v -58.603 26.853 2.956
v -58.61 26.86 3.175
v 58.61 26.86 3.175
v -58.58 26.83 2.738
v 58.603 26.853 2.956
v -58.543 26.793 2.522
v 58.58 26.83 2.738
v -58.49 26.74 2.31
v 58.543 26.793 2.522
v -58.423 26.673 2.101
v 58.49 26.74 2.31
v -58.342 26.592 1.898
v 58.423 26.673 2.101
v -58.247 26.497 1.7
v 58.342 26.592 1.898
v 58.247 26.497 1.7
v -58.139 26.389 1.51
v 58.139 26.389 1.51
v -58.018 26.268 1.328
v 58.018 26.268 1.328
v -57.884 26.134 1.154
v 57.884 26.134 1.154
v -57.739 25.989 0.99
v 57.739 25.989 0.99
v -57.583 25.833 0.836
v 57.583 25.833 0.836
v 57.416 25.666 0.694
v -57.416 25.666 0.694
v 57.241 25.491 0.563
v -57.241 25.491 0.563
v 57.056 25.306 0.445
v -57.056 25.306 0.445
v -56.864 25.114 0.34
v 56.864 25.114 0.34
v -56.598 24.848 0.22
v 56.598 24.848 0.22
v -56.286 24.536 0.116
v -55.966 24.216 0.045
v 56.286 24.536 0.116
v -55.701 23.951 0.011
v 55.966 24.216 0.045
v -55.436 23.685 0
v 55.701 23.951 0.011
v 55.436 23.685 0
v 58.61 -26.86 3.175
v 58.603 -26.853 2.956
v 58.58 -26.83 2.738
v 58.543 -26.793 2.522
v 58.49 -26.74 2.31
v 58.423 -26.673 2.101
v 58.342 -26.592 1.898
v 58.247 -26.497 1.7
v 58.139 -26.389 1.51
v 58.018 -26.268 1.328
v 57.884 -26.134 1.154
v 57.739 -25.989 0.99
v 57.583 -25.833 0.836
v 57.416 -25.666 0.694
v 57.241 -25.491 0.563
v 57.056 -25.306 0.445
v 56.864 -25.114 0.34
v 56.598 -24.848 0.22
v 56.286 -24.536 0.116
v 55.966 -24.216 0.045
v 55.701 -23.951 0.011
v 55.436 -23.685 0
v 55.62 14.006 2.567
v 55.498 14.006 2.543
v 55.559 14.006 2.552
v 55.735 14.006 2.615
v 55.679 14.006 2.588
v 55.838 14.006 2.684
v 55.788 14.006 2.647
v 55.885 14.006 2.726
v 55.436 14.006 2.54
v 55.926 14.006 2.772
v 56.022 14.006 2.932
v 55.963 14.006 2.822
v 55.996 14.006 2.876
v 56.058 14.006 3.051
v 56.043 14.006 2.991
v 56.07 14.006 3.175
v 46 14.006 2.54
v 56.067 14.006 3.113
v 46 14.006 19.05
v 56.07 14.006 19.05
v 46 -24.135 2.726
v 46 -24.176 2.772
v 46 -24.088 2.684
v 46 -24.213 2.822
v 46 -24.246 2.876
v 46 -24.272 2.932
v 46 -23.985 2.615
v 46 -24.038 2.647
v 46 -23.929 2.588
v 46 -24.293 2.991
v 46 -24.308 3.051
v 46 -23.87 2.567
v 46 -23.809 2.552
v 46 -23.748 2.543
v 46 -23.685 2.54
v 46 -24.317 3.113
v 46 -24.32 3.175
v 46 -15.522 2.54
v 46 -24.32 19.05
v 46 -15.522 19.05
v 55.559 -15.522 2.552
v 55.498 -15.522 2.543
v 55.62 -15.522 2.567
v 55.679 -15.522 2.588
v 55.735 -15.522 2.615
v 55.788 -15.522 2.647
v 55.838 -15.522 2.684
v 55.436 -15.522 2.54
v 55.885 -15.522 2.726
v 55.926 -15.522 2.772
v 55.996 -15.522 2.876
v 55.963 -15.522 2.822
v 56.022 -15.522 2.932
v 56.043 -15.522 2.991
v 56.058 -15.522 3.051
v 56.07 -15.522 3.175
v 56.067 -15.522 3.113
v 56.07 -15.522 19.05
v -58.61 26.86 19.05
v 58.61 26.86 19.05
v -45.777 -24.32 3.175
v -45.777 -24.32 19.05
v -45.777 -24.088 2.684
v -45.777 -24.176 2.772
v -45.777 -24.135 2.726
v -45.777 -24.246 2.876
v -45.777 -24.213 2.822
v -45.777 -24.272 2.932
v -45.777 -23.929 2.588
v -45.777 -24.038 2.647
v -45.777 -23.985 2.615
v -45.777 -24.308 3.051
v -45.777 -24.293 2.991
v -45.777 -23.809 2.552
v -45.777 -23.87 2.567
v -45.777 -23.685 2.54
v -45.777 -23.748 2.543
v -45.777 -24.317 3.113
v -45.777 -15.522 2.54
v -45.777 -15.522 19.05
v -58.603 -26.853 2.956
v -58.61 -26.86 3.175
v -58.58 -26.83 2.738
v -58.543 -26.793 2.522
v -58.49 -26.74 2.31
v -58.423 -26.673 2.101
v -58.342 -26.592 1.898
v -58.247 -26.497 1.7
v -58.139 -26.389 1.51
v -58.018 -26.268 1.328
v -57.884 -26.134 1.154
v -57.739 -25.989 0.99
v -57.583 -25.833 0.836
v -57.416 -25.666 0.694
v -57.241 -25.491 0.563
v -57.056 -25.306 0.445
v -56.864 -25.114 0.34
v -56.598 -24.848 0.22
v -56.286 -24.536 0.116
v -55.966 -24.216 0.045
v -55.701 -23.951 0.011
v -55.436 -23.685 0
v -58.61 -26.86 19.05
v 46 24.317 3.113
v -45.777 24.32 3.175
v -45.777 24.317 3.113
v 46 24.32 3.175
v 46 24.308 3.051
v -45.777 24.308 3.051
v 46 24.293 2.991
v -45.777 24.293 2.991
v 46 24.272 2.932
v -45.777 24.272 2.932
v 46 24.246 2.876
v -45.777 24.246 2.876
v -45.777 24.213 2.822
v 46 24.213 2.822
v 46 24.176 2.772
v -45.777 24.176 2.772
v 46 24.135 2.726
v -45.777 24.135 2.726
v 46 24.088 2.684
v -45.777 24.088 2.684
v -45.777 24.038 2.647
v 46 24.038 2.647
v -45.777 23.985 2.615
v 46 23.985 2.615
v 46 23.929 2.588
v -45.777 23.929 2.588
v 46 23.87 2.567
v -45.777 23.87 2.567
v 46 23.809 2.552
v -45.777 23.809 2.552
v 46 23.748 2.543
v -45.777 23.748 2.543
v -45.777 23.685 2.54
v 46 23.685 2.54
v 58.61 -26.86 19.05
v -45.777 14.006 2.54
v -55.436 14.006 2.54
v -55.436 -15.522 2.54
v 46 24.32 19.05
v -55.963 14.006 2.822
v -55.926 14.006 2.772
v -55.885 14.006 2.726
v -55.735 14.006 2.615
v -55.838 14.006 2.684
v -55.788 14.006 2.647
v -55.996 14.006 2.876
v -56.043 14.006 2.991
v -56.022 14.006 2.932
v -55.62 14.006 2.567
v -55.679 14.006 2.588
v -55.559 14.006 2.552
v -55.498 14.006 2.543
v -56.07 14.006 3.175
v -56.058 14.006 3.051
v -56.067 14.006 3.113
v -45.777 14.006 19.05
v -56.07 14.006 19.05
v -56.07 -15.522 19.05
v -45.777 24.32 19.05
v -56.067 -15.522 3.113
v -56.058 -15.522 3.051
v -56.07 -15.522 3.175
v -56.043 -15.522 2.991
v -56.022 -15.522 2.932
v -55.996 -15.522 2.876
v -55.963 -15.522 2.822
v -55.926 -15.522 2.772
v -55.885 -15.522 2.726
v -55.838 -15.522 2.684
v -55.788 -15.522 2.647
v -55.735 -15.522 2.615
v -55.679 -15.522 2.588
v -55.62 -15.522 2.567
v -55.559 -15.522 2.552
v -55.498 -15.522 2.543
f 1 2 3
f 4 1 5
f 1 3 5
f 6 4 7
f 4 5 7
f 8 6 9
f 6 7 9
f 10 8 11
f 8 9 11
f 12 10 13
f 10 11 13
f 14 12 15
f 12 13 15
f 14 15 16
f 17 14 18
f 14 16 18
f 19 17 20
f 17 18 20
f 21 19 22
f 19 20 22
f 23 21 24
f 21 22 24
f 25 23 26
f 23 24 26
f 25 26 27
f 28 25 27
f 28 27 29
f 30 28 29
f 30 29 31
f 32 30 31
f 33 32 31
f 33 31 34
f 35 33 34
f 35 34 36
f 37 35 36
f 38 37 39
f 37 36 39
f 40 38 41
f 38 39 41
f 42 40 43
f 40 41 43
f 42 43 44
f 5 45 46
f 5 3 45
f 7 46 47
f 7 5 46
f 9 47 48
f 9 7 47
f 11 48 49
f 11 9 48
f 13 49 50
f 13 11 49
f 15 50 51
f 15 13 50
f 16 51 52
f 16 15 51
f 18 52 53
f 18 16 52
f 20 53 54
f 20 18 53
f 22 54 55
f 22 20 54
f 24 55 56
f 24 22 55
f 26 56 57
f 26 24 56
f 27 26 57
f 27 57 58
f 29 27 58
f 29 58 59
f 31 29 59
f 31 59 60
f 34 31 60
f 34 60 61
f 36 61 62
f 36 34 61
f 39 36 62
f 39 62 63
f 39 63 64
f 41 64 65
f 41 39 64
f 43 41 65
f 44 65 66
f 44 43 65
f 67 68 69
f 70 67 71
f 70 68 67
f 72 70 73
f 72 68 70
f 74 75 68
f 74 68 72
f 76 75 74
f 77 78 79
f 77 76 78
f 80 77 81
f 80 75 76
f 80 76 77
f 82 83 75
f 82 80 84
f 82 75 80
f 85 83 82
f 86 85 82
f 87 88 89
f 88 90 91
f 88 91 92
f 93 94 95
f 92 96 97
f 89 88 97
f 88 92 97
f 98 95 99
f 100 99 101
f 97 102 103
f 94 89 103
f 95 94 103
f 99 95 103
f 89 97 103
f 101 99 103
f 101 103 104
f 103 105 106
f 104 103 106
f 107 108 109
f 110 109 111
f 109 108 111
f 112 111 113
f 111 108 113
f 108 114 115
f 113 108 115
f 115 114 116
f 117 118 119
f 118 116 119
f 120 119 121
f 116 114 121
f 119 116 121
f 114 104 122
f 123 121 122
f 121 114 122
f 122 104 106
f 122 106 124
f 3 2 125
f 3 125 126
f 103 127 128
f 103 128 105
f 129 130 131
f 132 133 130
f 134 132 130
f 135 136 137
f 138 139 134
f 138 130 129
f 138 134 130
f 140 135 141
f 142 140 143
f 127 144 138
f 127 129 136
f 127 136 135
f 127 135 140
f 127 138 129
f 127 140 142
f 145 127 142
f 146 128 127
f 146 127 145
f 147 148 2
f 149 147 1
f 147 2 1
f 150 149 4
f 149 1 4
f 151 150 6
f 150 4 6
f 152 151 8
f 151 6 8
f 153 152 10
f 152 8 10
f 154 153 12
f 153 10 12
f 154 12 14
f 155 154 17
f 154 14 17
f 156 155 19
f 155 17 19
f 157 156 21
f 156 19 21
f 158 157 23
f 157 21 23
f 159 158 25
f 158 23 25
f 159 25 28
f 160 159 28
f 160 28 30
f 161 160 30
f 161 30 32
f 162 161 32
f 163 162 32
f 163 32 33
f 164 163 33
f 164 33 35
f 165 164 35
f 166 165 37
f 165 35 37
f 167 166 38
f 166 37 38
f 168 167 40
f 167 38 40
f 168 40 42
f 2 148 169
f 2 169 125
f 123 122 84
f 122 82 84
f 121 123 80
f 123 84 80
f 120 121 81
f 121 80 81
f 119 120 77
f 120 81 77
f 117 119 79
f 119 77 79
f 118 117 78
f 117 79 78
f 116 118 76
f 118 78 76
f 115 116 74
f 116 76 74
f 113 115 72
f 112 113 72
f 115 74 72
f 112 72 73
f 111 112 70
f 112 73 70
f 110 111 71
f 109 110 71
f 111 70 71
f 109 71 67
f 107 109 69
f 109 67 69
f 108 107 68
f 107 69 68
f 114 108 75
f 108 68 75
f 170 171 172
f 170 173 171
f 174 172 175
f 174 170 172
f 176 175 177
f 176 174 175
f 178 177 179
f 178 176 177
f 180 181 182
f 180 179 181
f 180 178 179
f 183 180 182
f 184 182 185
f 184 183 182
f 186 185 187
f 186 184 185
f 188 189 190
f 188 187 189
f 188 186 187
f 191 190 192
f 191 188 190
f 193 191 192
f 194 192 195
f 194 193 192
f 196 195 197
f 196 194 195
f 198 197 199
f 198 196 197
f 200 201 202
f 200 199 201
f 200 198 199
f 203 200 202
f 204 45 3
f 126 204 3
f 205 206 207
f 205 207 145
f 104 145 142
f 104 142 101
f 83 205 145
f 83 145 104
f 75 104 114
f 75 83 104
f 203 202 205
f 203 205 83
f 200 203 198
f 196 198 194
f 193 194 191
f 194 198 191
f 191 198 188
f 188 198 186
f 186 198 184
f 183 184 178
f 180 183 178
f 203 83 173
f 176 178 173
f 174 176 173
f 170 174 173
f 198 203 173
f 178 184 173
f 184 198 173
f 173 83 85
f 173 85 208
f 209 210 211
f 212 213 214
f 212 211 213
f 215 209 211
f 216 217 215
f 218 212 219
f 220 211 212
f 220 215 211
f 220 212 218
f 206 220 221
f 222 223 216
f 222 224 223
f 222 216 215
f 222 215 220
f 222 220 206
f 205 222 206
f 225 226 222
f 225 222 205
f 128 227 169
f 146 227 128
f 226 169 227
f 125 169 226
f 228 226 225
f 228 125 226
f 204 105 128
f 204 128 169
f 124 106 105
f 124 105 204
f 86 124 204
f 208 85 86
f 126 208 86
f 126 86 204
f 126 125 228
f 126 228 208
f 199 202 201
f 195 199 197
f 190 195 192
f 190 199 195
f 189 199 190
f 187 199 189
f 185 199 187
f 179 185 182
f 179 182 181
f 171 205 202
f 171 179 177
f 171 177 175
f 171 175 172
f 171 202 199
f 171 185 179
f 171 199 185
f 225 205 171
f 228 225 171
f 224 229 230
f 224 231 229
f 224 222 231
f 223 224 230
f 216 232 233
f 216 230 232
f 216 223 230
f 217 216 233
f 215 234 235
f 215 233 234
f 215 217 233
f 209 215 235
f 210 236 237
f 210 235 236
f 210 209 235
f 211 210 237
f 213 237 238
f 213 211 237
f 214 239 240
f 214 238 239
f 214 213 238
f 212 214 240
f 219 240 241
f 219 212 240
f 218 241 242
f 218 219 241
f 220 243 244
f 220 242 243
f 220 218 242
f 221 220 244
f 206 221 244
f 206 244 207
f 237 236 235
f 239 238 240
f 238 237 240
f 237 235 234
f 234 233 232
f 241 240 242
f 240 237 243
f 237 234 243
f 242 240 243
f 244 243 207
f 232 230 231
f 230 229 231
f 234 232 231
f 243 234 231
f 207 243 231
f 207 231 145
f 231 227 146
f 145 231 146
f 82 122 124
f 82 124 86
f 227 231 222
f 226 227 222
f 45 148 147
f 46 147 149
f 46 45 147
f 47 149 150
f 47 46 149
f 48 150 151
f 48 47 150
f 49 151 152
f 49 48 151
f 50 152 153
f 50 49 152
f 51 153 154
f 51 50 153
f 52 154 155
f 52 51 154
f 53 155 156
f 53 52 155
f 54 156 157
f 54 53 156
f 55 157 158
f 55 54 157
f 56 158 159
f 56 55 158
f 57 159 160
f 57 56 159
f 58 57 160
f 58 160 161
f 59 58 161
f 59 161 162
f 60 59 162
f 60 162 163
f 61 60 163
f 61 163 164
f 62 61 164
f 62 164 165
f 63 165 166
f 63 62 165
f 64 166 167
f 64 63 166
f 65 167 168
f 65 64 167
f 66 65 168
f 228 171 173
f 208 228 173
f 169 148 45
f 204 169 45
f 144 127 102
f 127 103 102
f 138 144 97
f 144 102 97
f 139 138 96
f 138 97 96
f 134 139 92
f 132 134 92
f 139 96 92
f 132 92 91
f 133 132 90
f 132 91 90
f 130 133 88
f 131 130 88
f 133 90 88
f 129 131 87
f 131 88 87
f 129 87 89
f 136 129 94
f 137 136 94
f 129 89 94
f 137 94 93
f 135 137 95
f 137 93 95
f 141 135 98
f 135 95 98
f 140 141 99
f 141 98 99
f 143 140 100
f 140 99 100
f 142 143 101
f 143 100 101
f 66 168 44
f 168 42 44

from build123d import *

# Parameters (mm, degrees)
F0_W     = 117.221
F0_H     = 53.721
F1_DEPTH = 19.05
F2_R     = 3.175
F3_T     = -2.54
F5_W     = 11.2527239306
F5_H     = 9.8262102796
F5_W_2   = 11.6953600091
F5_H_2   = 12.192
F6_DEPTH = 17.78


# Not quite as in the source:
# - a feature names something its author has since deleted; it is built from what else it names


with BuildPart() as f1:
    # F0 (on Top) → F1 (new body)
    with BuildSketch(Plane.XY):
        Rectangle(F0_W, F0_H)
    extrude(amount=F1_DEPTH)

    # F2
    f2_edges = [f1.edges().sort_by_distance(p)[0] for p in [
        (0, -26.8605, 0),
        (-58.6105, 0, 0),
        (0, 26.8605, 0),
        (58.6105, 0, 0),
    ]]
    fillet(f2_edges, radius=F2_R)

    # F3
    f3_openings = [f1.faces().sort_by_distance(p)[0] for p in [
        (0, 0, 19.05),
    ]]
    offset(amount=F3_T, openings=f3_openings)

    # F5 (on offset) → F6 (join)
    with BuildSketch(Plane.XY.offset(19.05)):
        with Locations((-51.4034552881, -20.4349435174)):
            Rectangle(F5_W, F5_H)
        with Locations((51.8481470752, 20.1015706725)):
            Rectangle(F5_W_2, F5_H_2)
        with Locations((-51.4034552881, 20.1015706725)):
            Rectangle(F5_W, F5_H_2)
        with Locations((51.8481470752, -20.4349435174)):
            Rectangle(F5_W_2, F5_H)
    extrude(amount=-F6_DEPTH)


solid = f1.part
